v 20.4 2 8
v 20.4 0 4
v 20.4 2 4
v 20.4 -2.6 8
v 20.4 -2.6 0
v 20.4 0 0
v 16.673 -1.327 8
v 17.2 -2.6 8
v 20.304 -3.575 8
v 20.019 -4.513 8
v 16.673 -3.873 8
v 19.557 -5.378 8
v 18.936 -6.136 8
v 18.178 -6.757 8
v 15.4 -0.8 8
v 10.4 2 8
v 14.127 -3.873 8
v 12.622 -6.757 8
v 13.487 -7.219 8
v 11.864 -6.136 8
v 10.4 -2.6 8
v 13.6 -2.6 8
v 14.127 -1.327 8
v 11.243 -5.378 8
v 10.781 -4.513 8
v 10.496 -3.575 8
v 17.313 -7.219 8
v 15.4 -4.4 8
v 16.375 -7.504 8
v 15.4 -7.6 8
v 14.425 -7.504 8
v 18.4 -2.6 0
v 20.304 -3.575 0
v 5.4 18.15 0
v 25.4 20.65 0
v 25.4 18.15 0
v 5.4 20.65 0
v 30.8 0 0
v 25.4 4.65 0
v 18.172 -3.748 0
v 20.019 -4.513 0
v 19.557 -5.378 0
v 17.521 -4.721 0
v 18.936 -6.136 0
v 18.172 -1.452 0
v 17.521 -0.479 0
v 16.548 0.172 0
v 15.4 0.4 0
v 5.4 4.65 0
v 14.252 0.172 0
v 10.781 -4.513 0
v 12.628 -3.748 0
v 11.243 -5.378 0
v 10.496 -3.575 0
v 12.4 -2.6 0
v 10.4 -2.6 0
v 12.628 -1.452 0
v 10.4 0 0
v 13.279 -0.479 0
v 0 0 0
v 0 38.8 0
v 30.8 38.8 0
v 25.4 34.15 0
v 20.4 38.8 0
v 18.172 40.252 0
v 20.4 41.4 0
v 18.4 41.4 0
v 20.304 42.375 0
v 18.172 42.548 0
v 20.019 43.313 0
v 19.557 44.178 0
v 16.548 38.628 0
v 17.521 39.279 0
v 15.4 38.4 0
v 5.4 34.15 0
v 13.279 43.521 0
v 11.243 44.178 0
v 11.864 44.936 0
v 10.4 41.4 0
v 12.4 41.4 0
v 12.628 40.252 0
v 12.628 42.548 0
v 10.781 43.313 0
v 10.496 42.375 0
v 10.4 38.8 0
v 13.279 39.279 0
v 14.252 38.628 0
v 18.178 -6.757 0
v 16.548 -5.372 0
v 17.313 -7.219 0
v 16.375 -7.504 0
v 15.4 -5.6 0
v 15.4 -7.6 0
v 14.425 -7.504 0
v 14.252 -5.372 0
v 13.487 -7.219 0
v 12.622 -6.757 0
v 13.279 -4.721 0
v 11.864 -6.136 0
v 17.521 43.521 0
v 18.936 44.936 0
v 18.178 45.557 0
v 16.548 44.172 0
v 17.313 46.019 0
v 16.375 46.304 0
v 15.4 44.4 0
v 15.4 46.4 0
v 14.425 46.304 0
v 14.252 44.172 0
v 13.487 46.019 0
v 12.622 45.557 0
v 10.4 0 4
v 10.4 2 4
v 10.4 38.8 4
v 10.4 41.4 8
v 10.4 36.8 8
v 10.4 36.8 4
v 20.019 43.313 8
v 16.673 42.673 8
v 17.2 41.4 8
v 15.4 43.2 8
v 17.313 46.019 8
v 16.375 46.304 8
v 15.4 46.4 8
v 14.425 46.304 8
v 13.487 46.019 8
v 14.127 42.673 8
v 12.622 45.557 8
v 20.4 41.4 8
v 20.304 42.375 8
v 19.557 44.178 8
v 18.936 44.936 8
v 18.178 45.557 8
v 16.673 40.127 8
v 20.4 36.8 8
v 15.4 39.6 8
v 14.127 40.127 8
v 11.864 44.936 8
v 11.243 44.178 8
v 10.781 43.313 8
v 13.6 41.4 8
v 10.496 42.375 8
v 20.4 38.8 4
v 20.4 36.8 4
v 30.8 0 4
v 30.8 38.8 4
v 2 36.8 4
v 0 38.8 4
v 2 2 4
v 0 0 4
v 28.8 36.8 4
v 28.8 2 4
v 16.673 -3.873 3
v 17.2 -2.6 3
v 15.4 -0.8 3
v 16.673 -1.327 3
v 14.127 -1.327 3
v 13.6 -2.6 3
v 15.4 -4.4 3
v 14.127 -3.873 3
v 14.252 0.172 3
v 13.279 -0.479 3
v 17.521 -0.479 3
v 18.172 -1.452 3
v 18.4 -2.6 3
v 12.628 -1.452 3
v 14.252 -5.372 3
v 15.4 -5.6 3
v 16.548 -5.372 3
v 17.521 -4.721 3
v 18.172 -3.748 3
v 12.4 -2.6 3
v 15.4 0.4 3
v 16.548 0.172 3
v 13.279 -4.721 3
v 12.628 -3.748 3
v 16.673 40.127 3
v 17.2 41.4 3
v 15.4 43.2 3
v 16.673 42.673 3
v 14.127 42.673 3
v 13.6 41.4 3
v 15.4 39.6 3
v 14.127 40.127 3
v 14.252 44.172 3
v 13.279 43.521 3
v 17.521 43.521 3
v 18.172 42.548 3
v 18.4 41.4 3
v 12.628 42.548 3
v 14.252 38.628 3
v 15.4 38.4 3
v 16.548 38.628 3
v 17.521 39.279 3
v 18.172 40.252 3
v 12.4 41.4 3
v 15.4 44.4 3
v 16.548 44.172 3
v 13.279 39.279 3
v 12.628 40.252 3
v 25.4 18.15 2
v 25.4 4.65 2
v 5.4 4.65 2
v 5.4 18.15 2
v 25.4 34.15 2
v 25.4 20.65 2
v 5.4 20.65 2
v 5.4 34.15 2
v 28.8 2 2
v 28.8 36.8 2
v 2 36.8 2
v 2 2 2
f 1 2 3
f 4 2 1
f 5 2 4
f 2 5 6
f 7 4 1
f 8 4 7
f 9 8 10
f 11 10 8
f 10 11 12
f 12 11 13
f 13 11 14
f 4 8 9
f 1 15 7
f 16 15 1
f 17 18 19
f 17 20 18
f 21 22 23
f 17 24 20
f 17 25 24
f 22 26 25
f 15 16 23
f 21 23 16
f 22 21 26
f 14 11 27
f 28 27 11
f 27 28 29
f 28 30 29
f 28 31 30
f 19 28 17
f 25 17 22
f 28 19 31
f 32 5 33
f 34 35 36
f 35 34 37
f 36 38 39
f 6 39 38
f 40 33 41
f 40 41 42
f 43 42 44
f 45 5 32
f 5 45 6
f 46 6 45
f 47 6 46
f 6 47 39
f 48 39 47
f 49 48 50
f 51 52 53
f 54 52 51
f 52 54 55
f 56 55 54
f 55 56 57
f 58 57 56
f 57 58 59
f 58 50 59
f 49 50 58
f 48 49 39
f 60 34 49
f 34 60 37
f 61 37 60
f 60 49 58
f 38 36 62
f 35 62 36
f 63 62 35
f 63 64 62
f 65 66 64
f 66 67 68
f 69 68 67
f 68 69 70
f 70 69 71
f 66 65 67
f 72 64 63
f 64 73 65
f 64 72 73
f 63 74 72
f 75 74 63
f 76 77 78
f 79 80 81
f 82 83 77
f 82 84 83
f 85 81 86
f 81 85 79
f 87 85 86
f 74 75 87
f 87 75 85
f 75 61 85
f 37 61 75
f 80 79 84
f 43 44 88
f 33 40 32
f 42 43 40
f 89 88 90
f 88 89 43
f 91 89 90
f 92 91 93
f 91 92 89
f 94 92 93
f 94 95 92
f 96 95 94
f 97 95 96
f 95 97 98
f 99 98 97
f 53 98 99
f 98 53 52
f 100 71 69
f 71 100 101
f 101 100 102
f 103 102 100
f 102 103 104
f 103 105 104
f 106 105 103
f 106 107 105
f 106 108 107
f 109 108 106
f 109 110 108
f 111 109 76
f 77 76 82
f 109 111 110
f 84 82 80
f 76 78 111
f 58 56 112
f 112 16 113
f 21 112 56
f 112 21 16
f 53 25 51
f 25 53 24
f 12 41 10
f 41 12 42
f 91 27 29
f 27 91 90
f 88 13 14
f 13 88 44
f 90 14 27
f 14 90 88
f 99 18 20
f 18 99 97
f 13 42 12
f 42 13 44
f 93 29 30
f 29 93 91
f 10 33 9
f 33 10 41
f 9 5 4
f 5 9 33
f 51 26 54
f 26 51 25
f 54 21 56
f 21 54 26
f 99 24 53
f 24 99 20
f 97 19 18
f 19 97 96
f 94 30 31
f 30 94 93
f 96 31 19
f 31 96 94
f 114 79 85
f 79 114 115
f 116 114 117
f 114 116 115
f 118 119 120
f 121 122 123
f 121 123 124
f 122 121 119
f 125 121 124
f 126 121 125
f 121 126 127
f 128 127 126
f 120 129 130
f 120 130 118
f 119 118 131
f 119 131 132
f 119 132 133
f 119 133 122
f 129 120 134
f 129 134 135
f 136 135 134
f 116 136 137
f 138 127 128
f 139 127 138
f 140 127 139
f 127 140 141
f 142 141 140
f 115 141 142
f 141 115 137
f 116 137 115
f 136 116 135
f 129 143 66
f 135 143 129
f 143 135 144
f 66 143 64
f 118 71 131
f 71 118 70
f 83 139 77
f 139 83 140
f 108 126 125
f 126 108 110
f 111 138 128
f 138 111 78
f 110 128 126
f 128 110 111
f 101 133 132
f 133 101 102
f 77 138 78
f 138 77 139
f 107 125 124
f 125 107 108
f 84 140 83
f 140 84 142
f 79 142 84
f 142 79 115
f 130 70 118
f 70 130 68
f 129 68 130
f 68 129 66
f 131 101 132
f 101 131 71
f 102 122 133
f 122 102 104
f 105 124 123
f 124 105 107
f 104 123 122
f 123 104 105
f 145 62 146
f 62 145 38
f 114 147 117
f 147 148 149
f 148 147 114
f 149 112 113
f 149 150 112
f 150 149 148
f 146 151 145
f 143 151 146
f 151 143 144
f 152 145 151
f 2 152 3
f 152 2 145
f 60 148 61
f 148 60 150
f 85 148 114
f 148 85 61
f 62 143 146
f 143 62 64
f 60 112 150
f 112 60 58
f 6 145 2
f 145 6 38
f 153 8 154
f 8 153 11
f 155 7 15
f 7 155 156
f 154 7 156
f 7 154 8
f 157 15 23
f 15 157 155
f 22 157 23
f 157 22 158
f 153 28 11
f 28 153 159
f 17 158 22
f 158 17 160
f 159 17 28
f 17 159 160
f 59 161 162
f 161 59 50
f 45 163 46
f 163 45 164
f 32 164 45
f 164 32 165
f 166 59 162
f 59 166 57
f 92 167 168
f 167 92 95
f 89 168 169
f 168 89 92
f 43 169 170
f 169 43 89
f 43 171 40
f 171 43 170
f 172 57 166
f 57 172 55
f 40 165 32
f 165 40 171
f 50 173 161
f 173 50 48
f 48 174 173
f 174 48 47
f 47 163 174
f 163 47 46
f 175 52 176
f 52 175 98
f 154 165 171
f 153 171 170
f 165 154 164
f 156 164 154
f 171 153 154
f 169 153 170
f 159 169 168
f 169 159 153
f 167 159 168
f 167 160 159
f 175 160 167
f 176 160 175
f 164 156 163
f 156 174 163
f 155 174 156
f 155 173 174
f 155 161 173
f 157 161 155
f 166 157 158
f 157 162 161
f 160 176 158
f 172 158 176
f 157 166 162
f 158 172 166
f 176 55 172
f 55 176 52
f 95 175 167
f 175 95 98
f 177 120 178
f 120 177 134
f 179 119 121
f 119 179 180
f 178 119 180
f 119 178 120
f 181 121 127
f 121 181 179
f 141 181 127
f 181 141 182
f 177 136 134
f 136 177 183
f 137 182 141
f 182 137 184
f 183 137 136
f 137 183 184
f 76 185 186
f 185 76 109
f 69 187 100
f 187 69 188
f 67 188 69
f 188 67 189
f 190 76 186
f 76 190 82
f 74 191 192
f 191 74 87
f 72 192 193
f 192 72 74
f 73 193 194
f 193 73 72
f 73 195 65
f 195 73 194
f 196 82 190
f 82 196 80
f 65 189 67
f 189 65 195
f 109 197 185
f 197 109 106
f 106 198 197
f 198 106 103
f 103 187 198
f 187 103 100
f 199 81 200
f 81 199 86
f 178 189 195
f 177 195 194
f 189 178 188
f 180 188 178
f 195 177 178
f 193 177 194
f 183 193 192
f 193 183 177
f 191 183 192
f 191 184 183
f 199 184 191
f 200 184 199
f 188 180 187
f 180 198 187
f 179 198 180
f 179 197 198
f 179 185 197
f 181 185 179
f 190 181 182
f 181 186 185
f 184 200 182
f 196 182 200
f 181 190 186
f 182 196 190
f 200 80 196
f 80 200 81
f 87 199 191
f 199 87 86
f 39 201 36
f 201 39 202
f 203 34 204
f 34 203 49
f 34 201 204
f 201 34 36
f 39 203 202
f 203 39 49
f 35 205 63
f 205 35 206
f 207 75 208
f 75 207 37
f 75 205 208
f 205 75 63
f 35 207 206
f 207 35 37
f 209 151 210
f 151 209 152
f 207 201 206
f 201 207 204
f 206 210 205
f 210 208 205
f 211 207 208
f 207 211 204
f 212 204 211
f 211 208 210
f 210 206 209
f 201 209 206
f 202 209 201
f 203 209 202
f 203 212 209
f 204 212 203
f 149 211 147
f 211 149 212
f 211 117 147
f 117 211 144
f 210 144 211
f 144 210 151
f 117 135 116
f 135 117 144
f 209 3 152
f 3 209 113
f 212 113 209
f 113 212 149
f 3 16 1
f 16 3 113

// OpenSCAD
// file: SwitchHolderVars.scad
switchLength=22;
switchWidth=14;

height=24;
thickness=2;

innerLength=switchLength;
innerWidth=2*switchWidth+thickness;

outerLength=innerLength+2*thickness;
outerWidth=innerWidth+2*thickness;
totalHeight=height+thickness;

batteryHolderWidth=12;
batteryHolderThickness=4;
batteryHolderHeight=8;

screwHolderLength=12;
spaceBetweenScrews=60.5;
offsetFromScrews=10;
spaceBetweenSwitch=4;
firstScrewOffset=screwHolderLength+offsetFromScrews-batteryHolderWidth/2;
batteryHolderTotalLength=spaceBetweenScrews+2*offsetFromScrews+2*screwHolderLength+spaceBetweenSwitch;

nutM3HolderDiameter=10;
nutM3HolderRadius=nutM3HolderDiameter/2;
nutM3HolderDifferenceHeight=6;
nutM3HolderHeight=totalHeight-nutM3HolderDifferenceHeight;

wireWidth=6;
wireHeight=3;

//http://g02.a.alicdn.com/kf/UT82xCDXo8XXXagOFbXu/111613040/UT82xCDXo8XXXagOFbXu.jpg
nutM25Diameter=5.45+1.05;
nutM25Height=2+1.0;
screwM25Diameter=3;

nutM3Diameter=6+1;
nutM3Height=2.4+1.1;
screwM3Diameter=3.6;
screwM3HeadDiameter=5+1;
screwM3HeadHeight=3;

screwM4Diameter=4;

// Cover
switchHoleWidth=12.9+0.6;
switchHoleLength=19.2+0.8;

space=0.4;
coverInnerLength=outerLength+2*space;
coverInnerWidth=outerWidth+2*space;
coverOutsideLength=coverInnerLength+2*thickness;
coverOutsideWidth=coverInnerWidth+2*thickness;
coverHeight=2;
coverTotalHeight=thickness+coverHeight;
coverBorder=space+thickness;
coverOutsideScrewHolderHeight=nutM3HolderDifferenceHeight+thickness;
// main file
include<SwitchHolderVars.scad>;

module screwHolder(y,r)
{
	translate([coverOutsideLength/2,y,0])
	rotate([0,0,r])
	union()
	{
		translate([-nutM3HolderDiameter/2,0,0])
		cube([nutM3HolderDiameter,nutM3HolderRadius,coverOutsideScrewHolderHeight]);
		
		cylinder(d=nutM3HolderDiameter,h=coverOutsideScrewHolderHeight,$fn=32);
	}
}

module screwHolderHoles(y)
{
	translate([coverOutsideLength/2,y,-1])
	union()
	{
		cylinder(d=screwM3Diameter,h=coverOutsideScrewHolderHeight+2,$fn=8);
		
		cylinder(d=screwM3HeadDiameter,h=screwM3HeadHeight+1,$fn=16);
	}
}

module switchHoles()
{
	widthOffset=(thickness+switchWidth-switchHoleWidth)/2;
	diffWidth=switchWidth-switchHoleWidth;
	translate([coverOutsideLength/2-switchHoleLength/2,coverOutsideWidth/2,-1])
	union()
	{
		translate([0,-widthOffset-switchHoleWidth,0])
		cube([switchHoleLength,switchHoleWidth,thickness+2]);
		
		translate([0,widthOffset,0])
		cube([switchHoleLength,switchHoleWidth,thickness+2]);
	}
}

difference()
{
	union()
	{
		cube([coverOutsideLength,coverOutsideWidth,coverTotalHeight]);
		
		screwHolder(coverBorder-nutM3HolderRadius,0);
		
		screwHolder(coverOutsideWidth-coverBorder+nutM3HolderRadius,180);
	}
	
	translate([thickness,thickness,thickness])
	cube([coverInnerLength,coverInnerWidth,coverOutsideScrewHolderHeight]);
	
	screwHolderHoles(coverBorder-nutM3HolderRadius);
		
	screwHolderHoles(coverOutsideWidth-coverBorder+nutM3HolderRadius);
	
	switchHoles();
}
